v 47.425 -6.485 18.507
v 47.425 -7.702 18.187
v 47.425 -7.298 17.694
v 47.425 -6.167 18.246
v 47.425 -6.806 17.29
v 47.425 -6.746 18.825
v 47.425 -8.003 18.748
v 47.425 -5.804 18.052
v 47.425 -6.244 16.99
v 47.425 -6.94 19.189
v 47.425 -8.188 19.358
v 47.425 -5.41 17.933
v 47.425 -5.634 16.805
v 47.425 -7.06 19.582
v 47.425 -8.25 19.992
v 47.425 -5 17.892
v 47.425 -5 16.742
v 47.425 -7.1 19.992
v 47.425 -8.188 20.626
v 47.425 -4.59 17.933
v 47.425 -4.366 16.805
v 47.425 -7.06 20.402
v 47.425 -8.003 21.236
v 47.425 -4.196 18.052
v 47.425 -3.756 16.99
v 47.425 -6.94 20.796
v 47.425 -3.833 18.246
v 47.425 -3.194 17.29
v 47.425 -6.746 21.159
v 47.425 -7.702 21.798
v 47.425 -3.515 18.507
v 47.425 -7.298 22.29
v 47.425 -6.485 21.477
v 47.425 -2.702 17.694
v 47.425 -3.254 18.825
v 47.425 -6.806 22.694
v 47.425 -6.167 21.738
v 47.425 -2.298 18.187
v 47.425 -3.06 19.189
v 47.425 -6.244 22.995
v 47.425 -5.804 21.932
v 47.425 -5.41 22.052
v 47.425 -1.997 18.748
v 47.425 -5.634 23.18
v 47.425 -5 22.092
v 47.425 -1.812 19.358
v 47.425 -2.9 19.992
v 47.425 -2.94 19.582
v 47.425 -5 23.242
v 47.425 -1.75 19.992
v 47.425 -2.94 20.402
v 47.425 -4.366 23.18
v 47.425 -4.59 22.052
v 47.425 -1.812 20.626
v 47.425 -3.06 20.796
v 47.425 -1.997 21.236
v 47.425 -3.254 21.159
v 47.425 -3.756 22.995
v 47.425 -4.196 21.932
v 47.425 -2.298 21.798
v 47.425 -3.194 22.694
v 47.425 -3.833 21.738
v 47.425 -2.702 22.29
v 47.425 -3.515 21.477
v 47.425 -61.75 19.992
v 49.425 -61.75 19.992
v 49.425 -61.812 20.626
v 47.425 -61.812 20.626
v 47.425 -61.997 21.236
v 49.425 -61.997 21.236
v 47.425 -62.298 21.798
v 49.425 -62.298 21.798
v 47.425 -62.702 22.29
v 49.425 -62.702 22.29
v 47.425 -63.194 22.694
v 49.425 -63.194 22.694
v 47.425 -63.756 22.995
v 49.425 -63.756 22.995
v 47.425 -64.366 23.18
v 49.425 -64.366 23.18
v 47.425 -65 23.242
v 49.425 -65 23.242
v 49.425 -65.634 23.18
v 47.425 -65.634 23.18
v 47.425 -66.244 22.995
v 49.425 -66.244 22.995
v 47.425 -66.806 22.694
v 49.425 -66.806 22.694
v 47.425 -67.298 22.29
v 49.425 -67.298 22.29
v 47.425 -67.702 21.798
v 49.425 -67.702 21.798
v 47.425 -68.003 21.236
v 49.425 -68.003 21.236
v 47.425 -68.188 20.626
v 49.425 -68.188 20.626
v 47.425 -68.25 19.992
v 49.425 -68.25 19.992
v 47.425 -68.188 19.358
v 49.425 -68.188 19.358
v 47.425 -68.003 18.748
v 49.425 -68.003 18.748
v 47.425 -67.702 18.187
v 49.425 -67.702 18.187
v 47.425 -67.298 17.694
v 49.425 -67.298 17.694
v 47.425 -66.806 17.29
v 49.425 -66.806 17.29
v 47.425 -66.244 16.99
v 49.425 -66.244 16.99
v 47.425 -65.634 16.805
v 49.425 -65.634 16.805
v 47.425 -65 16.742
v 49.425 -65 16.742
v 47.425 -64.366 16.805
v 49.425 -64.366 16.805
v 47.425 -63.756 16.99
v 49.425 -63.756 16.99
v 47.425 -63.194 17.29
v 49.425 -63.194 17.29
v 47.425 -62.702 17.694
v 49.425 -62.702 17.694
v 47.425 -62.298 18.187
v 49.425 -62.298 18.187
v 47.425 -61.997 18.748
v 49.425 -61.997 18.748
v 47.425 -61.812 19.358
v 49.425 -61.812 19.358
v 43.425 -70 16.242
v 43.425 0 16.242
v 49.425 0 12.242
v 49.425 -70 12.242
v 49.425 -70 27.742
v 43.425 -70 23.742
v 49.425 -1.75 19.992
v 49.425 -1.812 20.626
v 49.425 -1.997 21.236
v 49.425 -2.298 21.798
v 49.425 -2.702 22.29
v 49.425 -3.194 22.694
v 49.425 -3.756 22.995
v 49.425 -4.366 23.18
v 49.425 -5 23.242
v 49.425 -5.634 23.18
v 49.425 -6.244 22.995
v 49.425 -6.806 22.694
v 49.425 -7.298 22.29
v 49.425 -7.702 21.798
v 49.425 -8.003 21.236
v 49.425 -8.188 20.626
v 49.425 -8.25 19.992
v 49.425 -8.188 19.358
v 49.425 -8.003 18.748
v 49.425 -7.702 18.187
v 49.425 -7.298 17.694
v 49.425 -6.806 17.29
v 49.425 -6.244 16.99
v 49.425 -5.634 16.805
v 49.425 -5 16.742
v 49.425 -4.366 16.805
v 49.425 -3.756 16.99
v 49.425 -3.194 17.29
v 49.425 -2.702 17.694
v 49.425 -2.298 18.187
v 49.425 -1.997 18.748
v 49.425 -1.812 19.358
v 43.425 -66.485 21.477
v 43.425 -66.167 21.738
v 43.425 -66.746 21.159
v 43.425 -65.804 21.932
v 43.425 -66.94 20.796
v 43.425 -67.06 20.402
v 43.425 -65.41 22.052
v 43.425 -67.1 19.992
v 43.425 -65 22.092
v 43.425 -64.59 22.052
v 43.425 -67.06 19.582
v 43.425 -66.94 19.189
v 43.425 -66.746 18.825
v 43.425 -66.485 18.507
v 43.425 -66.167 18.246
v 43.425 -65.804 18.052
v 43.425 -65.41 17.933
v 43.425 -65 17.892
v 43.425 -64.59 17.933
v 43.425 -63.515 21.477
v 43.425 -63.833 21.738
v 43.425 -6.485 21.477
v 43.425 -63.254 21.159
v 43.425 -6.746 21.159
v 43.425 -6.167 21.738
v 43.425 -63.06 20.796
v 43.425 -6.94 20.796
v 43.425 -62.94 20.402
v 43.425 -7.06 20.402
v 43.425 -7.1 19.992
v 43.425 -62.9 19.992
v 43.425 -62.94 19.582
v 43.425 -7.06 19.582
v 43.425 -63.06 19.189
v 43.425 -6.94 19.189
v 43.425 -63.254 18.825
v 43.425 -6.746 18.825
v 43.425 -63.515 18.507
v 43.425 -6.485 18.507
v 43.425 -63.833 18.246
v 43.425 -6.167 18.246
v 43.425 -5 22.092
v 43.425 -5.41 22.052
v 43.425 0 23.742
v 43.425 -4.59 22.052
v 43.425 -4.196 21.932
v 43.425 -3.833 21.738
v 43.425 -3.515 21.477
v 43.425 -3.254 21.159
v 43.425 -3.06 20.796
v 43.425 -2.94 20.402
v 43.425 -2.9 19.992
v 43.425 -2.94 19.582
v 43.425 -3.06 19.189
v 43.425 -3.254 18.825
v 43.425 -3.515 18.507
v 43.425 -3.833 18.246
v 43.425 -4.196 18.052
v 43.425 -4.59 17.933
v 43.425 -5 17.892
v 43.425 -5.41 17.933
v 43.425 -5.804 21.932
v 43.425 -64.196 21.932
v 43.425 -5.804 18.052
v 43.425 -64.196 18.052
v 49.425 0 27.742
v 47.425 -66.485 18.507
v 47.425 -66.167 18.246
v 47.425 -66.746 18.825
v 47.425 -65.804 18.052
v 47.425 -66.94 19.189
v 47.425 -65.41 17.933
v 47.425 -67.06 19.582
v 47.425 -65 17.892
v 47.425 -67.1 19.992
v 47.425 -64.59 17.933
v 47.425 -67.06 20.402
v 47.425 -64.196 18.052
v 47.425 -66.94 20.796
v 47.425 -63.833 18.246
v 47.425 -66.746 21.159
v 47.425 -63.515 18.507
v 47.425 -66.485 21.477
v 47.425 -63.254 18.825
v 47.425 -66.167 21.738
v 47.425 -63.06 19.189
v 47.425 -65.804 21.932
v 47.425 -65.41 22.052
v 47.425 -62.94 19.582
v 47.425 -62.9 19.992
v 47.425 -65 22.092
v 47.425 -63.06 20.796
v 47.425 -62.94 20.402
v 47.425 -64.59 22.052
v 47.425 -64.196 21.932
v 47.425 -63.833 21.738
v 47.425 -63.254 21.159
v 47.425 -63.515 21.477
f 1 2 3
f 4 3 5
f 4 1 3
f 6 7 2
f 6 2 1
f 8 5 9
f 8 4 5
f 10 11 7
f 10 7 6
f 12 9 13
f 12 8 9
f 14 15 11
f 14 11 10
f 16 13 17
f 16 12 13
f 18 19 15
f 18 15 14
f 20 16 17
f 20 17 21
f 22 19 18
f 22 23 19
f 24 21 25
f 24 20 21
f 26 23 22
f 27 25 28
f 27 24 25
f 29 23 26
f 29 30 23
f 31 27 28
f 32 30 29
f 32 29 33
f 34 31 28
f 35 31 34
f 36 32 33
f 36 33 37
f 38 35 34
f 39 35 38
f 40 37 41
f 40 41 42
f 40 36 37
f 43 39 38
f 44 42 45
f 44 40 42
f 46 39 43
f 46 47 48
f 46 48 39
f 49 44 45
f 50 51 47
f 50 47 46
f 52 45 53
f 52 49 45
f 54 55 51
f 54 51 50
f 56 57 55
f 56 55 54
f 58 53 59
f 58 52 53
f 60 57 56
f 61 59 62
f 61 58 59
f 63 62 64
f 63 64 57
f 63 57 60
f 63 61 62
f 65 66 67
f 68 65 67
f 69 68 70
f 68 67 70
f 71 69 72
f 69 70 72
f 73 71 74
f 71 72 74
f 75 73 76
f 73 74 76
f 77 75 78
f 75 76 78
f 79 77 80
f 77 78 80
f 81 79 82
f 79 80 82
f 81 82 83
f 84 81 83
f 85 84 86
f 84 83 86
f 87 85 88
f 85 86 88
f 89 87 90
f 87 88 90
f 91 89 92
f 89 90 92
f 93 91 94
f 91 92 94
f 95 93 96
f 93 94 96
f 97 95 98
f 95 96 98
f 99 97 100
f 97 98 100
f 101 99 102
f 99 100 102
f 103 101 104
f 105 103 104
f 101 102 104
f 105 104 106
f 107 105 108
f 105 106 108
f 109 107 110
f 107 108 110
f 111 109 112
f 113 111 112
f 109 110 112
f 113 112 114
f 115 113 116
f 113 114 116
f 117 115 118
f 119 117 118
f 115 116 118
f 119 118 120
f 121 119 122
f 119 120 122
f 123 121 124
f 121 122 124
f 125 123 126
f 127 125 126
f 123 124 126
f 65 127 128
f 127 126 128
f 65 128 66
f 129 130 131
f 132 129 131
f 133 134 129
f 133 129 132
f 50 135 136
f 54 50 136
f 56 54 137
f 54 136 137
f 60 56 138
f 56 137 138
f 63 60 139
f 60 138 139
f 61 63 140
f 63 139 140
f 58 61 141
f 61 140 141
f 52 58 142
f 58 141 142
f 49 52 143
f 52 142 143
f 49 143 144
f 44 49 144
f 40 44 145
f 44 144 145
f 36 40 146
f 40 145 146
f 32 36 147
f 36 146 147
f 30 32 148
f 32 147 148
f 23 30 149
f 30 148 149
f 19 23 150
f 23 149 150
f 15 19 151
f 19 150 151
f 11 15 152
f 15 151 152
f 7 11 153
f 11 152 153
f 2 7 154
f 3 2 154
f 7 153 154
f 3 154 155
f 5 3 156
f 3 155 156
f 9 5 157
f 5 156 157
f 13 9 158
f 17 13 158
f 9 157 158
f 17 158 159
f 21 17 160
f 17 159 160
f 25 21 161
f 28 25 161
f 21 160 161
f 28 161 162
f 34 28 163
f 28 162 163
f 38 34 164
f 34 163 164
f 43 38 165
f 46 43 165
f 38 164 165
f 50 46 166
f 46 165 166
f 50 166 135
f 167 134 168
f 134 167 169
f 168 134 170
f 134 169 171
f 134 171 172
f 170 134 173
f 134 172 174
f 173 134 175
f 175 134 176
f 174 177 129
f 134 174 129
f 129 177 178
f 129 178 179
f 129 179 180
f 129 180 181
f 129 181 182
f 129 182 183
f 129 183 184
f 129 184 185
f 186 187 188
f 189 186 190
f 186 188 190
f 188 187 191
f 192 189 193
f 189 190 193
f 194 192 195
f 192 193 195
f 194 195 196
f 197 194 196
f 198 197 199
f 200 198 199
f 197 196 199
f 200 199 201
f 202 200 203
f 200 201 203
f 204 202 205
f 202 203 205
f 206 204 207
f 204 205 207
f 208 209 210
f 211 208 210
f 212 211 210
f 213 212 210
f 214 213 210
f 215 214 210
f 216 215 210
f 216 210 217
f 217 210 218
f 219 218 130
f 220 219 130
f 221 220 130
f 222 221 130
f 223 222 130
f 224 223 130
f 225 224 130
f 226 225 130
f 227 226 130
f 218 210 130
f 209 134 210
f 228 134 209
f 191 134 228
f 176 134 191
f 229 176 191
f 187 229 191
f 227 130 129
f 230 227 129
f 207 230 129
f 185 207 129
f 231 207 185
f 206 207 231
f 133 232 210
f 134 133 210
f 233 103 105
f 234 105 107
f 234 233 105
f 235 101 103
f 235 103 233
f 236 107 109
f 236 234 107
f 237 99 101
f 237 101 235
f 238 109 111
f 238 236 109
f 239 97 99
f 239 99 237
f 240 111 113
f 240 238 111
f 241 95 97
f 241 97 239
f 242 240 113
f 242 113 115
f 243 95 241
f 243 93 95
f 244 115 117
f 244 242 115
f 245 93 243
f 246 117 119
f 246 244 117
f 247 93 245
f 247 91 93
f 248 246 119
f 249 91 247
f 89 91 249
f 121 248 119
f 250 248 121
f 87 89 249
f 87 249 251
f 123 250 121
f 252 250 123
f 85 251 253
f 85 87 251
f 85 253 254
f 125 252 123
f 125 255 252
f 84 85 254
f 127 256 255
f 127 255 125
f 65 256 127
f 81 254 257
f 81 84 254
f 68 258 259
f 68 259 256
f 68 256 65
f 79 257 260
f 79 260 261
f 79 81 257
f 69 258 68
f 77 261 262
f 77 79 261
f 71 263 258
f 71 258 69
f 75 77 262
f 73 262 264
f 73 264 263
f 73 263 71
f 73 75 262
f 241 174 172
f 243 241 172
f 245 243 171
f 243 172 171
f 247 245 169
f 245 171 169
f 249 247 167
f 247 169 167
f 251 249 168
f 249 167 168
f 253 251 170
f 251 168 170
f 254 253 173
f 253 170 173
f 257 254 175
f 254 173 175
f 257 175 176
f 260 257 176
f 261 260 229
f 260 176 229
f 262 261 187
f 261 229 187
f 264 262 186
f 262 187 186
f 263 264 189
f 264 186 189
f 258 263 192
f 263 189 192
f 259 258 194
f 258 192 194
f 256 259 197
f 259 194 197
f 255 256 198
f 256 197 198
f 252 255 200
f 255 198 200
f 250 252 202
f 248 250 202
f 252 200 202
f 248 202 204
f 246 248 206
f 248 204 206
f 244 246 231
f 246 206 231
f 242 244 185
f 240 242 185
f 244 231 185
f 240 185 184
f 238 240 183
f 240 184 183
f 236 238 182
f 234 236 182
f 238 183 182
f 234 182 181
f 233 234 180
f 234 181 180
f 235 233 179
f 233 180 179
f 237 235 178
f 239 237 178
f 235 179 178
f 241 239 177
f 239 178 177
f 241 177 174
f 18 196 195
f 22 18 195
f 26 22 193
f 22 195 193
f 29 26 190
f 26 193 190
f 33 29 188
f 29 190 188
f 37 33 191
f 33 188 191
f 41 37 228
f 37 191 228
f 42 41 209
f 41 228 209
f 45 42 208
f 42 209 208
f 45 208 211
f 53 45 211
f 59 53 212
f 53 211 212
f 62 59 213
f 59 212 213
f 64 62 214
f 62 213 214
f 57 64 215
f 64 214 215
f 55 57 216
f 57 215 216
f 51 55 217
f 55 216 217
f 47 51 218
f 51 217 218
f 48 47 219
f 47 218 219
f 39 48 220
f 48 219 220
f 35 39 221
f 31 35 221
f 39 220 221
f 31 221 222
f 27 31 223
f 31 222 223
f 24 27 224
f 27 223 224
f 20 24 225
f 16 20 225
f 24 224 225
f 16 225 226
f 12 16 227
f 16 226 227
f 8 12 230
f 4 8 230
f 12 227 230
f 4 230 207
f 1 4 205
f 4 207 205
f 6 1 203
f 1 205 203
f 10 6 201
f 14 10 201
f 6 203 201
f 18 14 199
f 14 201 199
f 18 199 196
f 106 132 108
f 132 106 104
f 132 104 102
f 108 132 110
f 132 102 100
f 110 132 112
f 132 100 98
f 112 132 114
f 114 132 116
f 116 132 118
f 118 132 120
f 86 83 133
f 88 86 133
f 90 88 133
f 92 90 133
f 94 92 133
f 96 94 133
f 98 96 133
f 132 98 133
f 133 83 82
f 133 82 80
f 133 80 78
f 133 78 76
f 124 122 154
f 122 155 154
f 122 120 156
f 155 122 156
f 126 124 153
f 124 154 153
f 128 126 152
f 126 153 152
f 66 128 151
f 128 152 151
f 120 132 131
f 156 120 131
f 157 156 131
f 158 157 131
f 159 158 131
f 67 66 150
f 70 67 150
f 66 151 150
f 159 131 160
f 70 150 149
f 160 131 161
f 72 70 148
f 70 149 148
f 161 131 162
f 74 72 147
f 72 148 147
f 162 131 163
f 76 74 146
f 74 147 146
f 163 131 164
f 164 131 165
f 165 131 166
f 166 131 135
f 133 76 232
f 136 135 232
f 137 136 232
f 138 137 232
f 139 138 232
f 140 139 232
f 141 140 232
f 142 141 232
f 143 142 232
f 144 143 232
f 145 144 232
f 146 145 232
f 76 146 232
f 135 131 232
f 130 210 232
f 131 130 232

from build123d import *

# Parameters (mm, degrees)
F1_DEPTH = 70
F2_R     = 3.25
F3_DEPTH = 2
F4_R     = 2.1
F5_DEPTH = 4


with BuildPart() as f1:
    # F0 (on Front) → F1 (new body)
    with BuildSketch(Plane.XZ):
        Polygon((49.424573, 12.242154), (49.424573, 27.742154), (43.424573, 23.742154), (43.424573, 16.242154), align=None)
    extrude(amount=F1_DEPTH)

    # F2 (on face) → F3 (cut)
    with BuildSketch(Plane.YZ.offset(49.424573)):
        with Locations((-65, 19.992154)):
            Circle(F2_R)
        with Locations((-5, 19.992154)):
            Circle(F2_R)
    extrude(amount=-F3_DEPTH, mode=Mode.SUBTRACT)

    # F4 (on face) → F5 (cut)
    with BuildSketch(Plane(origin=(43.424573, 0, 0), x_dir=(0, -1, 0), z_dir=(-1, 0, 0))):
        with Locations((5, 19.992154)):
            Circle(F4_R)
        with Locations((65, 19.992154)):
            Circle(F4_R)
    extrude(amount=-F5_DEPTH, mode=Mode.SUBTRACT)


solid = f1.part
